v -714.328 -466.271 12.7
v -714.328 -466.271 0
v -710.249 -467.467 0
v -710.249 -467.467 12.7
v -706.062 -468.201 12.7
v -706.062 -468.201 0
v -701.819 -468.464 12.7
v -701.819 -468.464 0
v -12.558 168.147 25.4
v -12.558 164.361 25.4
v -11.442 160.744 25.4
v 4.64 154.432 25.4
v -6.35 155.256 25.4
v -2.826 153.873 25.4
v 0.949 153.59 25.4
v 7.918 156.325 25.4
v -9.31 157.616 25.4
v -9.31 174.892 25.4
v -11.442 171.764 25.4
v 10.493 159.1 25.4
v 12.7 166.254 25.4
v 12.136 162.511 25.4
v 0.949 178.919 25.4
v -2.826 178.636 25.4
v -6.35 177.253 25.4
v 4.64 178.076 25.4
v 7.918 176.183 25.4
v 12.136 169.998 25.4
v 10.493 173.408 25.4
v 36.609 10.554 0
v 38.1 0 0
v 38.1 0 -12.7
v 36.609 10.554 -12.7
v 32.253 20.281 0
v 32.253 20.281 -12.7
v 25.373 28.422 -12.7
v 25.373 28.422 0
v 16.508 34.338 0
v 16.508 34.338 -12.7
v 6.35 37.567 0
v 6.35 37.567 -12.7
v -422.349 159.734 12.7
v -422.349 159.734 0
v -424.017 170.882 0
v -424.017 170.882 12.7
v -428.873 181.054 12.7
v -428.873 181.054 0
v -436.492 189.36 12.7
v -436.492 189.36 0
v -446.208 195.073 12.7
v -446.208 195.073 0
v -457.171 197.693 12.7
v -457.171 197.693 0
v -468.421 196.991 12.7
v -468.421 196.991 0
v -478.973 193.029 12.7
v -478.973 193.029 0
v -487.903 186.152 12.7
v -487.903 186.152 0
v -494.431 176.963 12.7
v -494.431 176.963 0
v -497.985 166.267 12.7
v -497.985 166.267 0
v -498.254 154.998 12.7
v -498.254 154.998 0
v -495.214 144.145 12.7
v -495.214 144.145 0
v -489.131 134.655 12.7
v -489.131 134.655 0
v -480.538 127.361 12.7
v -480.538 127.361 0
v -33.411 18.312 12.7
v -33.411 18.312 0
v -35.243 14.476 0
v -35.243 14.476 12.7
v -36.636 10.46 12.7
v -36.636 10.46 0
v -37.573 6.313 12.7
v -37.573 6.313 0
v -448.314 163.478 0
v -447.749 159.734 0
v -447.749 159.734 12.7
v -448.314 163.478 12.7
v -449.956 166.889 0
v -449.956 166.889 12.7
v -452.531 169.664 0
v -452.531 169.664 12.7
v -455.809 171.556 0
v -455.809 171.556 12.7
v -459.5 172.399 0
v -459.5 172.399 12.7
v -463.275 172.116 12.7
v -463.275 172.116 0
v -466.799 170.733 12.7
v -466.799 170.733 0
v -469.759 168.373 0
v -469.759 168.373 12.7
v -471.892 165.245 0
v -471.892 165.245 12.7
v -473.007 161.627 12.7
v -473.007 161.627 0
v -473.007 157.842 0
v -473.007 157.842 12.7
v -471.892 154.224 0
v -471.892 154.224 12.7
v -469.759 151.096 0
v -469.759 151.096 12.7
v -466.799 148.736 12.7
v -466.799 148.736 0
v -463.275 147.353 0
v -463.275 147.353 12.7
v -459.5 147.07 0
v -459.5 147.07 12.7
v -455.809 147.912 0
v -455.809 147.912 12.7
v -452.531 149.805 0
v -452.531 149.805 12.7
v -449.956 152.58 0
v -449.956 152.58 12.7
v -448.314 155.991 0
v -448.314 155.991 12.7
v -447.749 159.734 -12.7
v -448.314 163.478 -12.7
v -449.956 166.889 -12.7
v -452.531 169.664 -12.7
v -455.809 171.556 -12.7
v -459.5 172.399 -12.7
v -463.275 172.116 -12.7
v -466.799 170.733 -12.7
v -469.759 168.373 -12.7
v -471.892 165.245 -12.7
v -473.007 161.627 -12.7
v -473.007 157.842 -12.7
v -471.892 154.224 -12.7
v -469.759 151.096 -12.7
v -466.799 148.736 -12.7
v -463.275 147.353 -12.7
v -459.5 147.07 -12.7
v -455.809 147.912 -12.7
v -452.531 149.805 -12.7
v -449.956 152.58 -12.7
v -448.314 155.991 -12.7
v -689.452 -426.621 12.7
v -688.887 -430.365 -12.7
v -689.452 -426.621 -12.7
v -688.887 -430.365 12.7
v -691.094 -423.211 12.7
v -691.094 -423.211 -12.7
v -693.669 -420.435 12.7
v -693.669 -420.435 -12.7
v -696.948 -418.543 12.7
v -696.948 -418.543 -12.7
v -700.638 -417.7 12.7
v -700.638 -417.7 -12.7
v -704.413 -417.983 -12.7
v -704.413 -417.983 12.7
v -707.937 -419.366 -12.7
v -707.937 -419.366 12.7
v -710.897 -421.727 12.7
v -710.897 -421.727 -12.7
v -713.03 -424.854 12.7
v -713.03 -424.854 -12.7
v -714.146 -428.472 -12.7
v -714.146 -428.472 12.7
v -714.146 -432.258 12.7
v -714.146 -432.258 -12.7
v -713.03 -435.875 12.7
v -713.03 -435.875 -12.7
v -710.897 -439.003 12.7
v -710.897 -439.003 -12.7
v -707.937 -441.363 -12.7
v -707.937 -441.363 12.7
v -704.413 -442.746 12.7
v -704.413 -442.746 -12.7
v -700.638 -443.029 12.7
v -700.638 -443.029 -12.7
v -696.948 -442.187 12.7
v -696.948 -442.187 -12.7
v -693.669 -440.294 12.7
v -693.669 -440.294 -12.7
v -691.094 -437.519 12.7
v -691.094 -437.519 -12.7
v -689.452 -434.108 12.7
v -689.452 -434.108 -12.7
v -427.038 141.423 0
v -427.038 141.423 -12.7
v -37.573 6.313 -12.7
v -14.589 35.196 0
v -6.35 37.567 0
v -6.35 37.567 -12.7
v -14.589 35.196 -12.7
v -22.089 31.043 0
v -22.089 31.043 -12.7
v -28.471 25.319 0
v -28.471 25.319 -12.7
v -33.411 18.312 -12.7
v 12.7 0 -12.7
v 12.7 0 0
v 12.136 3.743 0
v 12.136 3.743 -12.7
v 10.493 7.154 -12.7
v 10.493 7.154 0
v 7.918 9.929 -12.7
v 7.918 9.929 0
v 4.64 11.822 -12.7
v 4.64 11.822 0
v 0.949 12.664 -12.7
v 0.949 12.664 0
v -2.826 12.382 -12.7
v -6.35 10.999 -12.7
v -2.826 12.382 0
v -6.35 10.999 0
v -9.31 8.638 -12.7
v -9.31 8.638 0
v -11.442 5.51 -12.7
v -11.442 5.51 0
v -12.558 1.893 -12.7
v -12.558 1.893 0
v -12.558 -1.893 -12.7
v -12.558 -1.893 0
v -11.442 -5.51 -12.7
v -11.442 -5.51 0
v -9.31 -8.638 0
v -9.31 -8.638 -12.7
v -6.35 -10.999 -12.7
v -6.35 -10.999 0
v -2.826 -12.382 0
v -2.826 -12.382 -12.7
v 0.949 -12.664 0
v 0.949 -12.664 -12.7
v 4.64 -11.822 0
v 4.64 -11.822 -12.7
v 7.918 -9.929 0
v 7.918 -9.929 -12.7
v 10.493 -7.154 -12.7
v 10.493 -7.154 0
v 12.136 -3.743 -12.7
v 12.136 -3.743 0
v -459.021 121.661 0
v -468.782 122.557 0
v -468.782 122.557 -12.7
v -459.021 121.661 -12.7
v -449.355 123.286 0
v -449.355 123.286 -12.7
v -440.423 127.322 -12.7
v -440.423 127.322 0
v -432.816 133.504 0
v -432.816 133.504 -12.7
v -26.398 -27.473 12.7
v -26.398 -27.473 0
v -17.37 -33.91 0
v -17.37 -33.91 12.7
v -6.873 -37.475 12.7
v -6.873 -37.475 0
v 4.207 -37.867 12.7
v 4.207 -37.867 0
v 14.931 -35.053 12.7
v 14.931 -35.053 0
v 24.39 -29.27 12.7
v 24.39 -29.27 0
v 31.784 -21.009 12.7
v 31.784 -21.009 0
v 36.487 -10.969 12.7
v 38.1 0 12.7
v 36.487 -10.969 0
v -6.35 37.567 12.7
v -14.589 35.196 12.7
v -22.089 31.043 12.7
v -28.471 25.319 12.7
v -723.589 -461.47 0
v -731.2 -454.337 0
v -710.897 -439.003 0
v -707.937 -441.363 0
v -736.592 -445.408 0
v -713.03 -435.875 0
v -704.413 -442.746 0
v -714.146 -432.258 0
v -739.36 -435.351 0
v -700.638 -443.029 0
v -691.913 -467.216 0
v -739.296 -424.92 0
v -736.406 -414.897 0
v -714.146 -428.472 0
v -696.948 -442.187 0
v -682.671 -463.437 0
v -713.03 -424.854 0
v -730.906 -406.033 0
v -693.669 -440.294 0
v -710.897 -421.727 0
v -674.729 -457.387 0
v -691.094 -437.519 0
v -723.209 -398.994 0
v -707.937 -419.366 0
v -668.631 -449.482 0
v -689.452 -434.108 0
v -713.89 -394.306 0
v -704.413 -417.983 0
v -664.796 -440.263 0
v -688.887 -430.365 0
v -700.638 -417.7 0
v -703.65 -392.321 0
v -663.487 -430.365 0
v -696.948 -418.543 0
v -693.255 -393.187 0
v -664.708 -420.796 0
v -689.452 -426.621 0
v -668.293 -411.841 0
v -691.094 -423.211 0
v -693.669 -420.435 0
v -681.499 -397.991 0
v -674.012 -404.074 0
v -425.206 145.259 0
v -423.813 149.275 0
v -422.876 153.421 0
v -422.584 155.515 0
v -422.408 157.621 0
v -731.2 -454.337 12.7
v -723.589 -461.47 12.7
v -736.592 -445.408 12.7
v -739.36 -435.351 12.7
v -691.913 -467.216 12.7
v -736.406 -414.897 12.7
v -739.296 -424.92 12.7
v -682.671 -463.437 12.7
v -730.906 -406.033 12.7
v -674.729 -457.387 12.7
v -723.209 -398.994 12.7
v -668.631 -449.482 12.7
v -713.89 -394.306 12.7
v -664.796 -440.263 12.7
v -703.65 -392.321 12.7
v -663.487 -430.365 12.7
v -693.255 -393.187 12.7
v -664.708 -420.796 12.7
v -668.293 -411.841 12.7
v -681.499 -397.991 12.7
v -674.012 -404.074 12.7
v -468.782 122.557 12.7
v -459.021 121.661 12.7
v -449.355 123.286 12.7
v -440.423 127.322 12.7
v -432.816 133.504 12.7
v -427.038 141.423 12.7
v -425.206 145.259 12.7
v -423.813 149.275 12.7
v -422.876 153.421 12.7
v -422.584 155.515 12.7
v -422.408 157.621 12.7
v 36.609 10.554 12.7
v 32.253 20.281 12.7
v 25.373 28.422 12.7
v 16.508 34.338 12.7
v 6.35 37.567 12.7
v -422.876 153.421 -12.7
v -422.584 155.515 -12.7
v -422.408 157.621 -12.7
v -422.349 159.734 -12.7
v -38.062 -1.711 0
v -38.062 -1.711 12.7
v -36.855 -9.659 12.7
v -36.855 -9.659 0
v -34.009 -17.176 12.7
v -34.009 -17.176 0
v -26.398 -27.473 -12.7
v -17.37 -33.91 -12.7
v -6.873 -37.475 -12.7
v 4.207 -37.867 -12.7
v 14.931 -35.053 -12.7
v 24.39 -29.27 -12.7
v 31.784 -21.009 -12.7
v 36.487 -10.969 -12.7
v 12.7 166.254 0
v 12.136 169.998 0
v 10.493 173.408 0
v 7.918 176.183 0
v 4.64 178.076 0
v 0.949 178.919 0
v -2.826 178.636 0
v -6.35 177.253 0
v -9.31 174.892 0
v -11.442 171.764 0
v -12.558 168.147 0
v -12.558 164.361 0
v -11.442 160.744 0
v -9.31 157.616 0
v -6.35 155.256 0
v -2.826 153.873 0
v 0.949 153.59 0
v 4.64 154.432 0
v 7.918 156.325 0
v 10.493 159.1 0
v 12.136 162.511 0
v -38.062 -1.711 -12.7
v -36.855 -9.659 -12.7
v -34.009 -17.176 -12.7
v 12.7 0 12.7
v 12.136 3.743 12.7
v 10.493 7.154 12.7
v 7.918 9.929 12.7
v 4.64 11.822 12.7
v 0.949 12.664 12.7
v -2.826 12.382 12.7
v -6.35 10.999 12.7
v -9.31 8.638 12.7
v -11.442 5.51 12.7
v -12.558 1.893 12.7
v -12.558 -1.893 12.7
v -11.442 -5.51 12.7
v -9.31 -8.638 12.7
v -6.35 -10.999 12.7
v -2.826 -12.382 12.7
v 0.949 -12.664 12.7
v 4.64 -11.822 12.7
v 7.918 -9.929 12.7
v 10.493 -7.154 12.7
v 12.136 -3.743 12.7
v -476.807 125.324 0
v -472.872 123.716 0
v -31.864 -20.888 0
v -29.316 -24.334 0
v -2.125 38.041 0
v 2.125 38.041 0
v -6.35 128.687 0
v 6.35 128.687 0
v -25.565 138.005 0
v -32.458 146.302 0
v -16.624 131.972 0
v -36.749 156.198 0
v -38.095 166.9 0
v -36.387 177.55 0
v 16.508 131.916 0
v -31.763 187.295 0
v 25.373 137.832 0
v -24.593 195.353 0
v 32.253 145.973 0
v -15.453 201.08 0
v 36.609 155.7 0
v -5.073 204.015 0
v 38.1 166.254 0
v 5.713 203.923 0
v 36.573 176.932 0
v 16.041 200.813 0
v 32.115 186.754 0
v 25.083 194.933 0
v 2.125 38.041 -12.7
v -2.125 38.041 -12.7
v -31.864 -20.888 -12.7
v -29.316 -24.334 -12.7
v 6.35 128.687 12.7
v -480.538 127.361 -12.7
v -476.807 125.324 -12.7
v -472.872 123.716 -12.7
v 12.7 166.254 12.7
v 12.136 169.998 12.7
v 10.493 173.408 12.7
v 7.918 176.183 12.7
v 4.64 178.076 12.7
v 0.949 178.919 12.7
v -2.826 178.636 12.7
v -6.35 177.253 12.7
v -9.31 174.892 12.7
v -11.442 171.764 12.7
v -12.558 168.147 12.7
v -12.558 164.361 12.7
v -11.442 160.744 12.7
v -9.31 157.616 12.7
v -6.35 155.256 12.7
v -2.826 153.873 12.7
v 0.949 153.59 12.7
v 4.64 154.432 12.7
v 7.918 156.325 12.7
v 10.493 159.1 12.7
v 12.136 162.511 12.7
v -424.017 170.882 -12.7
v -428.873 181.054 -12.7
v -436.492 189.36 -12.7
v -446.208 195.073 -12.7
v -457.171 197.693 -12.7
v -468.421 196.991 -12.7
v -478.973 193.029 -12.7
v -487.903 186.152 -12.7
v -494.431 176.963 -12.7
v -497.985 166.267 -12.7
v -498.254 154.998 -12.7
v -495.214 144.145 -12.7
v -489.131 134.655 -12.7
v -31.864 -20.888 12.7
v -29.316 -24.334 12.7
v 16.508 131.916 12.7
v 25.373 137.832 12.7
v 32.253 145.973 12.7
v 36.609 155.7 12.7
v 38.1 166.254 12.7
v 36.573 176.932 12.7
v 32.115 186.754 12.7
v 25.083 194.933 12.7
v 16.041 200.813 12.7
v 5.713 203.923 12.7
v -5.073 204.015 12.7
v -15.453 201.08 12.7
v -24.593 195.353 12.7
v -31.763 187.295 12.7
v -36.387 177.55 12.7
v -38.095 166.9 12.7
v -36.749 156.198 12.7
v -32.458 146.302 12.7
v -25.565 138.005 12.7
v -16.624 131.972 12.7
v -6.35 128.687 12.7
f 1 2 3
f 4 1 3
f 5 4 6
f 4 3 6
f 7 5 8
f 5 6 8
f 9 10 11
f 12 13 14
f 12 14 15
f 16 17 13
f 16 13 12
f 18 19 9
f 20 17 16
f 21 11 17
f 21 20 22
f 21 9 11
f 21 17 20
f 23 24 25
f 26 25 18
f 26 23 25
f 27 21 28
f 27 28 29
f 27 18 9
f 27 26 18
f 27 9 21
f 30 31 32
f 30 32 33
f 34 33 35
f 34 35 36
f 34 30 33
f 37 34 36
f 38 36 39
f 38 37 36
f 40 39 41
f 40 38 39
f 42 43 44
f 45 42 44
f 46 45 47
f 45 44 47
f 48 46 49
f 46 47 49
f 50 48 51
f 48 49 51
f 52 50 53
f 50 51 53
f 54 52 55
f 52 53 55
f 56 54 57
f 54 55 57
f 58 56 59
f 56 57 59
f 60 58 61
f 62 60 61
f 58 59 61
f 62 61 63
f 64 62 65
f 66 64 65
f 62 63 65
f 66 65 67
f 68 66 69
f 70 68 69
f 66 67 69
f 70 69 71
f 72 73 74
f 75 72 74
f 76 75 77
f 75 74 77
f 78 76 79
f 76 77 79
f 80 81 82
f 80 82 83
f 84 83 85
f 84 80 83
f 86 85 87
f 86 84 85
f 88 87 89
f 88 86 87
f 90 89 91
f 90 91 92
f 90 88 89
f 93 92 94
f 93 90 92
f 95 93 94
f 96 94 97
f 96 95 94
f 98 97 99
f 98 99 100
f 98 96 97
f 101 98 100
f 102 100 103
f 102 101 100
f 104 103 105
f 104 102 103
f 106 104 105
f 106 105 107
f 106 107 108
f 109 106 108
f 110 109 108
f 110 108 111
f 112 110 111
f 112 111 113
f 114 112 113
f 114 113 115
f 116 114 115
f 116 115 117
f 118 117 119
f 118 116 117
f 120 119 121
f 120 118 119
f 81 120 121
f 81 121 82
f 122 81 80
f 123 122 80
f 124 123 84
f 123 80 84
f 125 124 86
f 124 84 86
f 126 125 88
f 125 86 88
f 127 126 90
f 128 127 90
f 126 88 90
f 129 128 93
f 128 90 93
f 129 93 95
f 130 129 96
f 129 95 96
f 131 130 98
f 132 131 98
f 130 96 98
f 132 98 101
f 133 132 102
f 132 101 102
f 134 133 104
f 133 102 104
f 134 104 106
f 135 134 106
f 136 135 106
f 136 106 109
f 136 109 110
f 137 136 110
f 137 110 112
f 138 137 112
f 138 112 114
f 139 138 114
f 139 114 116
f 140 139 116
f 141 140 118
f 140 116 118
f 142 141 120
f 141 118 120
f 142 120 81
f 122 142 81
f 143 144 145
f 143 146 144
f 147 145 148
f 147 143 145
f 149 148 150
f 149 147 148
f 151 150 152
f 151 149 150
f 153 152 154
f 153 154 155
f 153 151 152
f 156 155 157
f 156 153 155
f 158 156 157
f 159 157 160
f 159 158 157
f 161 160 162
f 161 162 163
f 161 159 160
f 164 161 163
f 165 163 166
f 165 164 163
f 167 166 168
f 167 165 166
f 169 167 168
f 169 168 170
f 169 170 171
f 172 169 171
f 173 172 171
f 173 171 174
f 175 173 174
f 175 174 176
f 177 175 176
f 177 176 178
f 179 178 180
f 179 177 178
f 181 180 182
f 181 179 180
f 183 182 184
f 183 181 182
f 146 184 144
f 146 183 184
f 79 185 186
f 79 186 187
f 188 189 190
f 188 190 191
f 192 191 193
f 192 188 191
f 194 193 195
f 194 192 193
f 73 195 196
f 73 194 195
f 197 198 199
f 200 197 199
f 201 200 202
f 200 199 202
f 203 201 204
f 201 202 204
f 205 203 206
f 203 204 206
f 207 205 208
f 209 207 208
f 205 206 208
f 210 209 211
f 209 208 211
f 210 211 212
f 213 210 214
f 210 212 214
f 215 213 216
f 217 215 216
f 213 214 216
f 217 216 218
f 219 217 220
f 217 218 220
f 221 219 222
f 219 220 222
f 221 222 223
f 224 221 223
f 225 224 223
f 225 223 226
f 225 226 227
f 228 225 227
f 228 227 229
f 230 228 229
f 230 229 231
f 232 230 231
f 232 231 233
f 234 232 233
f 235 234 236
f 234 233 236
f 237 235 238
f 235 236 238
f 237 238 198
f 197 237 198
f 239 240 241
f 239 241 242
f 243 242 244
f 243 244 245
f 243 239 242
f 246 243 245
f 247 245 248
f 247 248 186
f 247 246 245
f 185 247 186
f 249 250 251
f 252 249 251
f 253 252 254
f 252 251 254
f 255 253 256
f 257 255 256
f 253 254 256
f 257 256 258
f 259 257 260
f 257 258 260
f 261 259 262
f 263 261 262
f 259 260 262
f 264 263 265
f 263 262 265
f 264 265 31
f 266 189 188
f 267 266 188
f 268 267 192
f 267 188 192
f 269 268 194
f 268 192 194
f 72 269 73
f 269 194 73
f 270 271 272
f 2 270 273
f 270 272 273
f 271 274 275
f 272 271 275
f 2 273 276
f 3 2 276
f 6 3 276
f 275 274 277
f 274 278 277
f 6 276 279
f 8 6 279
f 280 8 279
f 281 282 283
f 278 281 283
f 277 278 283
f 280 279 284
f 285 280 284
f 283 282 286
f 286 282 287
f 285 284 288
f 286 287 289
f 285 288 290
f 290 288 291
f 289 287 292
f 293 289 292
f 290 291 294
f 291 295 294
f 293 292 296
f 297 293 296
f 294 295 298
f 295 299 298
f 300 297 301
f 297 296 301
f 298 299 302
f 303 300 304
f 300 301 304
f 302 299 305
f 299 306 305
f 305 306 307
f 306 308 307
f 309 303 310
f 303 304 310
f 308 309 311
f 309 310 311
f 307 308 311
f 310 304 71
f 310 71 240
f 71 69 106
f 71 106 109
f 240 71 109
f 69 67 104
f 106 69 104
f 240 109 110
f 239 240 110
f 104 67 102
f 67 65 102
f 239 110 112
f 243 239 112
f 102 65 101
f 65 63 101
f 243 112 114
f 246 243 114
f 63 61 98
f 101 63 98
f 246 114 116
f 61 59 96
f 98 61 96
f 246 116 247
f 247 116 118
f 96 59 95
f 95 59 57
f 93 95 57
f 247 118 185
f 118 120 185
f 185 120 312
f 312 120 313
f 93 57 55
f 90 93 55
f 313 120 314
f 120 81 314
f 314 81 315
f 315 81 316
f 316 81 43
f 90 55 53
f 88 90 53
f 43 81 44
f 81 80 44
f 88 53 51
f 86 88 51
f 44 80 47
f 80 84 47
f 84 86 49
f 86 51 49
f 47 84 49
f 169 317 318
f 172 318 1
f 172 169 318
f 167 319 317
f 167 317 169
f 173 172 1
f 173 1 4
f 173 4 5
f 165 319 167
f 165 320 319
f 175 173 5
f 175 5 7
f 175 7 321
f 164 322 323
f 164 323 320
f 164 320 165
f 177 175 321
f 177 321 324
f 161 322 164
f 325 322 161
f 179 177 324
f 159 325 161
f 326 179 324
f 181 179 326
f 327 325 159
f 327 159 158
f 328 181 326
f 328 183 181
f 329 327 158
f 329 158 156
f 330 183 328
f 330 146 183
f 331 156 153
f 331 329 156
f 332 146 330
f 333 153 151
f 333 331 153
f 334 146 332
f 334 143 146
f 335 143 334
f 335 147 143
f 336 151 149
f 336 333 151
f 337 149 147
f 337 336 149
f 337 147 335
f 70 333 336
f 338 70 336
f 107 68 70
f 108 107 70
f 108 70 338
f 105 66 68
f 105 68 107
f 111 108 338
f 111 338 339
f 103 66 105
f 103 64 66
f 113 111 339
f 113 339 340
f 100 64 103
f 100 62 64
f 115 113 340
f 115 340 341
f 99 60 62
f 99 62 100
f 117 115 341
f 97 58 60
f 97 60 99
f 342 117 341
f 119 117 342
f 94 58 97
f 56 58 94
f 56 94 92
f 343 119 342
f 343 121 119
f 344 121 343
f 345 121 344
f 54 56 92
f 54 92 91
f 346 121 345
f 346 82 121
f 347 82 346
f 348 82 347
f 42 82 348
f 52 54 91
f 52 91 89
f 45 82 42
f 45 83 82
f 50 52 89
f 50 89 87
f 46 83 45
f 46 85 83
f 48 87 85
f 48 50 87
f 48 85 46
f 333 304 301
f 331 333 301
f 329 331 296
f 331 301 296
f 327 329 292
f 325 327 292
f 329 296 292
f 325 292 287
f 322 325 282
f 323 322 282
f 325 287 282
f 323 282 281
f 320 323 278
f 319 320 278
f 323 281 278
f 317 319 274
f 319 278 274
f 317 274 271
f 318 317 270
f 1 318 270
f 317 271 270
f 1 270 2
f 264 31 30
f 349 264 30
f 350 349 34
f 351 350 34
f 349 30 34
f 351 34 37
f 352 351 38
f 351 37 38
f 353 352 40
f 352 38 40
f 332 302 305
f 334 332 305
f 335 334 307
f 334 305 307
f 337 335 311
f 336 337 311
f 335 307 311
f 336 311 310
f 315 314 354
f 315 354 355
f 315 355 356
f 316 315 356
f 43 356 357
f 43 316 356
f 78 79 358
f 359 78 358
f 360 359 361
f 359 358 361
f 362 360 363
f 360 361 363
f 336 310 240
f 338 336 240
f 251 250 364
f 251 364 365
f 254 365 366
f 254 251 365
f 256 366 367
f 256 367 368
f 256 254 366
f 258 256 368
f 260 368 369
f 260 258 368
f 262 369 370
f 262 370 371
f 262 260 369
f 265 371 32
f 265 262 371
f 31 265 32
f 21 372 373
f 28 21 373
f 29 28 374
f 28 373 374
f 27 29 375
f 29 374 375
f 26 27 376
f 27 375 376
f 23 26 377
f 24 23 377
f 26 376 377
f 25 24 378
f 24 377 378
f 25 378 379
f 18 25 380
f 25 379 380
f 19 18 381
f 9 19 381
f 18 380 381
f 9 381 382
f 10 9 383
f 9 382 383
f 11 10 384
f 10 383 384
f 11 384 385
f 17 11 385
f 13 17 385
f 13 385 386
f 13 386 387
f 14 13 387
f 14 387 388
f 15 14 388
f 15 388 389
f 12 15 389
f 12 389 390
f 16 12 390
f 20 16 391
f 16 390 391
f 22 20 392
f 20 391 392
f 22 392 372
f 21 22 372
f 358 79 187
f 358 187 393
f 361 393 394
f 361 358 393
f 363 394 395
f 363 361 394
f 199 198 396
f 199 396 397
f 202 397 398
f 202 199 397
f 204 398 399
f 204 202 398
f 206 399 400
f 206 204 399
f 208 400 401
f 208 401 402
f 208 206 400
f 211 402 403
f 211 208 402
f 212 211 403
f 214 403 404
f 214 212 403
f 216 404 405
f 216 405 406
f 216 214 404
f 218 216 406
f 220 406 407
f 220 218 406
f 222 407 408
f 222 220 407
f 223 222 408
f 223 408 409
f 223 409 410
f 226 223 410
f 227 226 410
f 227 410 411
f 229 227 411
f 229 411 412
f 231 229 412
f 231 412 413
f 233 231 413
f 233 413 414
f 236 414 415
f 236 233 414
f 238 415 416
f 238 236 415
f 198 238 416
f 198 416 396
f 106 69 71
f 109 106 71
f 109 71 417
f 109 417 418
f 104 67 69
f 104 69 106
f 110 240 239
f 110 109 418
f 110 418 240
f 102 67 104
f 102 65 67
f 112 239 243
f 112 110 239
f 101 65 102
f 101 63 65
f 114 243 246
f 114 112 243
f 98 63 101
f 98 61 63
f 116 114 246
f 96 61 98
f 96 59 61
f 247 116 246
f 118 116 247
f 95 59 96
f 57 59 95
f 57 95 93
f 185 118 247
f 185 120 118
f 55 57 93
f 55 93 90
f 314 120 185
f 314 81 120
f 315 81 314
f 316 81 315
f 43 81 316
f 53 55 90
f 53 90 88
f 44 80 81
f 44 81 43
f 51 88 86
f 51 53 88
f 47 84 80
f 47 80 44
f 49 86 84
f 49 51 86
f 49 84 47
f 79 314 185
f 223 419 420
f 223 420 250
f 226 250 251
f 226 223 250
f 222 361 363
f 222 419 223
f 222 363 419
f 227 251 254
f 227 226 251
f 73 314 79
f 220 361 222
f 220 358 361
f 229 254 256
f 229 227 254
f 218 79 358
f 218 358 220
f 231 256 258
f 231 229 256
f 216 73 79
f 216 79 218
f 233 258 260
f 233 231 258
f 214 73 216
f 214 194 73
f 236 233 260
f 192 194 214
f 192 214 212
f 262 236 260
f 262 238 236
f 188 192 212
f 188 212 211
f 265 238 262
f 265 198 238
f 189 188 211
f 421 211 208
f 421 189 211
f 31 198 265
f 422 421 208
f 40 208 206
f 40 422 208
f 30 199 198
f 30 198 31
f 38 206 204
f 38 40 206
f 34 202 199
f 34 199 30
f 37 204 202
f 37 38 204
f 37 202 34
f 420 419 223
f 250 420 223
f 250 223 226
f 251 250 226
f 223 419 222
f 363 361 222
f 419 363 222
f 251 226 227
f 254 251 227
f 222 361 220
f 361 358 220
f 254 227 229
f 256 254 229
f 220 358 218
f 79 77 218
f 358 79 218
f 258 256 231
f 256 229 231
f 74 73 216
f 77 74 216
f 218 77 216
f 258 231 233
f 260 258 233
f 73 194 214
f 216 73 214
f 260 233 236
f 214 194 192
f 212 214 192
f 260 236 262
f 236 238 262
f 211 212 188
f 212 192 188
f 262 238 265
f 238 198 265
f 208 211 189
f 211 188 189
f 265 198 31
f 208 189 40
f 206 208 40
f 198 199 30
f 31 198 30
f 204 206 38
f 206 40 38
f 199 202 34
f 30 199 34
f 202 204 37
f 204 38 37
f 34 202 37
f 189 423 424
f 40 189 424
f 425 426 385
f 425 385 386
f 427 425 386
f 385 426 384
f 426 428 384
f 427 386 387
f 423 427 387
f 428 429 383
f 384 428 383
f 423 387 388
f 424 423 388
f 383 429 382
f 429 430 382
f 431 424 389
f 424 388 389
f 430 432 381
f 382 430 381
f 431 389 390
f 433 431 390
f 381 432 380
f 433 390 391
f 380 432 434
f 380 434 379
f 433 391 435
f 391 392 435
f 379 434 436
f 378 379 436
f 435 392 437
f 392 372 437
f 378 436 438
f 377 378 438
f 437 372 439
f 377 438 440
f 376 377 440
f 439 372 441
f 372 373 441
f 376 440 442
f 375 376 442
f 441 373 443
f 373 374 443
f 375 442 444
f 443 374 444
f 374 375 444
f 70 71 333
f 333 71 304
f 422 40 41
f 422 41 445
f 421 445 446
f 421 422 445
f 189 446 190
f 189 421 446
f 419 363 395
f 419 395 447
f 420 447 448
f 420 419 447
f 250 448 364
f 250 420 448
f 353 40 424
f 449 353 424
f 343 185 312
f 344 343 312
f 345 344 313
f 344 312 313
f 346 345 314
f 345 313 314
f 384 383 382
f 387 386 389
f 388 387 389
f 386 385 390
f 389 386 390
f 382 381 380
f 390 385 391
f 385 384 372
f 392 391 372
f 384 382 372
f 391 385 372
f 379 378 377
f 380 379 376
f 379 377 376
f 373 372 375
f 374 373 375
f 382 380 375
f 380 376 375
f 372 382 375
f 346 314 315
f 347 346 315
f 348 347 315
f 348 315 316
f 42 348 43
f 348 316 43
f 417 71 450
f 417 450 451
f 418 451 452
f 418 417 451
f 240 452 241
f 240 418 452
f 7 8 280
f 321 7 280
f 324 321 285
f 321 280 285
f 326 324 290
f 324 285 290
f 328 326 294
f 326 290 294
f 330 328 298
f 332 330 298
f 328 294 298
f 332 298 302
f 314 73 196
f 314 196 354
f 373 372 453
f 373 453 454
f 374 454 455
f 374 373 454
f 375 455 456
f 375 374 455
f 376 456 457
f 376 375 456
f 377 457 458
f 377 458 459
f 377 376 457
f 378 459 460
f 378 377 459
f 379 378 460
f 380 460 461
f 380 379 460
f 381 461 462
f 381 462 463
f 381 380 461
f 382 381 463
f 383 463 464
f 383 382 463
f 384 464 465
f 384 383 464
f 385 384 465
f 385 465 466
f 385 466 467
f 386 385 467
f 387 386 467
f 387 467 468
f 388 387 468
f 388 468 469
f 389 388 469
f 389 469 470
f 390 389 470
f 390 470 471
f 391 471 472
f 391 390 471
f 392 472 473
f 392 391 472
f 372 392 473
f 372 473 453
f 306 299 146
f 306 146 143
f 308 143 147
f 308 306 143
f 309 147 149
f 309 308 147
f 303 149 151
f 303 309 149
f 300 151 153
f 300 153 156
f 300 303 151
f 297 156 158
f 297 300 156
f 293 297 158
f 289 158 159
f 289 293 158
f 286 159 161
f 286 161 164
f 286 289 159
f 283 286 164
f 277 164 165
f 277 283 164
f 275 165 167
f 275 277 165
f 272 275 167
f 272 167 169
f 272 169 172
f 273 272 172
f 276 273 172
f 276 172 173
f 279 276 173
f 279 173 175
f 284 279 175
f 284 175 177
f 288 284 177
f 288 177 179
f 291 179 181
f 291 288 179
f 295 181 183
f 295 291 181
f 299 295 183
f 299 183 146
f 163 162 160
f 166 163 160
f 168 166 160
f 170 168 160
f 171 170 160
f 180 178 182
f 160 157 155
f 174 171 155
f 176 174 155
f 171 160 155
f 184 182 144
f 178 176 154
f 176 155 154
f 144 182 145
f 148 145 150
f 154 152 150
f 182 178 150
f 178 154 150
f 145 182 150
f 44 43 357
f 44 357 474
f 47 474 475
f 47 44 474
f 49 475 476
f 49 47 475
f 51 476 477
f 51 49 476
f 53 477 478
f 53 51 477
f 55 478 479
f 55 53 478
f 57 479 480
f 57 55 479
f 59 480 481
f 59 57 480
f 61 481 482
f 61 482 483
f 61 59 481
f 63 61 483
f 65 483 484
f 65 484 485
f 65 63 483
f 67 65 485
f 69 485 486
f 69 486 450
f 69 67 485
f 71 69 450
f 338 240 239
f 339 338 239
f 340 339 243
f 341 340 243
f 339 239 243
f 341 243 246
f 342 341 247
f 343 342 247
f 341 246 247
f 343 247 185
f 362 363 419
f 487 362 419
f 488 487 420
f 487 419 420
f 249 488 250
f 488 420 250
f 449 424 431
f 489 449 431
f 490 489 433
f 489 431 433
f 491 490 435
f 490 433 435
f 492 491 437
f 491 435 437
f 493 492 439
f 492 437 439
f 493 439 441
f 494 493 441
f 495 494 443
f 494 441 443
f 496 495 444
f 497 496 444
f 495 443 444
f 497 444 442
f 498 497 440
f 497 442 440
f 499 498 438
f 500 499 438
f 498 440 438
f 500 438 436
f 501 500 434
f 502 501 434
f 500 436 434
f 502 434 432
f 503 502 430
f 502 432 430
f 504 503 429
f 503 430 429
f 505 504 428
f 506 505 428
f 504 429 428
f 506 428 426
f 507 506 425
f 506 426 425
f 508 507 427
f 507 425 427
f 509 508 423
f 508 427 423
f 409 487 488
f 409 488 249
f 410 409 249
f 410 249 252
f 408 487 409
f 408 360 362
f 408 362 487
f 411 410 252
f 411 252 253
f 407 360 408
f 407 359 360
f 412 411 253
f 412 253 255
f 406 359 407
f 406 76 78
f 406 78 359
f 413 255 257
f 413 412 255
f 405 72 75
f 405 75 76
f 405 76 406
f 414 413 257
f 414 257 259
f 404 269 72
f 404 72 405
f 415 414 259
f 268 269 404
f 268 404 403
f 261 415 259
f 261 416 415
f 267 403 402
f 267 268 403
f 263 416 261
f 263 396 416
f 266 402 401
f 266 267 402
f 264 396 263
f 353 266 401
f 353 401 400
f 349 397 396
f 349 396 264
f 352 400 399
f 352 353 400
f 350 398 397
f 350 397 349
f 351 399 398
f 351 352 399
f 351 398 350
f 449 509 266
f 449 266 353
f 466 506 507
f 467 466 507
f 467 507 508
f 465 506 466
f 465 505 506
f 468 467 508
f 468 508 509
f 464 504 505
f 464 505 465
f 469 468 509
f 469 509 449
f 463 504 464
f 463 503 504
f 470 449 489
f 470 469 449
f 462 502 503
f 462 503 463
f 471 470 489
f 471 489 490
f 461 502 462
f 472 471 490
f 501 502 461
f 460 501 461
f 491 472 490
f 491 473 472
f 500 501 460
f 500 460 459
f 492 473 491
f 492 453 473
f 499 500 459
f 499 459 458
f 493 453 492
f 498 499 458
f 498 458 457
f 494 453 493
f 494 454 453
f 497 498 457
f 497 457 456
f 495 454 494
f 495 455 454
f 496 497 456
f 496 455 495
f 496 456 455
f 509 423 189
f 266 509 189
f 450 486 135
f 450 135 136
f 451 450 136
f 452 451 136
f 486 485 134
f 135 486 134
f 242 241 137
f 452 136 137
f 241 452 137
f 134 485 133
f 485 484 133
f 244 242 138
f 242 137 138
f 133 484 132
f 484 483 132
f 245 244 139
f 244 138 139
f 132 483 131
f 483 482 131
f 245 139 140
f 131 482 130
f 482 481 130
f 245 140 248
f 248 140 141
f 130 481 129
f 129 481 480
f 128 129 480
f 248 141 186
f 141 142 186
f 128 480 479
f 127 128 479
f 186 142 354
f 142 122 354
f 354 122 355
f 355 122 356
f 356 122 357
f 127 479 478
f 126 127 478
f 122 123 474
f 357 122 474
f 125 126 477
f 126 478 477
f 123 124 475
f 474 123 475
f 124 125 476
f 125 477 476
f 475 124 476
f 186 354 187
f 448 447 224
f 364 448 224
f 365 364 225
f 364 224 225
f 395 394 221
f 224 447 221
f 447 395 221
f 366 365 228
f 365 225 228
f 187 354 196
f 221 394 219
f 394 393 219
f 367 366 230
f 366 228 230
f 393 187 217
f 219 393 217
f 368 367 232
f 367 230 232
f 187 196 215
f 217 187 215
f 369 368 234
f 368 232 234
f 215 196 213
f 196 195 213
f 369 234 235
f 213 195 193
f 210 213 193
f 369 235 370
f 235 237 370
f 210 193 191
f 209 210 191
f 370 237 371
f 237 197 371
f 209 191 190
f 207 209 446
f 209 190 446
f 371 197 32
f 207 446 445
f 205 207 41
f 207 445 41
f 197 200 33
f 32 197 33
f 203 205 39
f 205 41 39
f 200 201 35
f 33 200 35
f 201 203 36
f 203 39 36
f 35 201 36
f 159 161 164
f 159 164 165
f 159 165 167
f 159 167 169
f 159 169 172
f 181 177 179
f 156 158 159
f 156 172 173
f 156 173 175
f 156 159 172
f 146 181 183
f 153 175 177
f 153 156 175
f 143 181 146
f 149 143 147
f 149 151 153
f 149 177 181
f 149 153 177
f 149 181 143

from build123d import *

# Parameters (mm, degrees)
F0_R          = 12.7
F1_DEPTH      = 12.7
F2_DEPTH      = 25.4
F3_DEPTH      = 12.7
F4_DEPTH      = 12.7
F5_DEPTH      = 12.7
F5_DEPTH_BACK = 12.7


with BuildPart() as f1:
    # F0 (on Top) → F1 (new body)
    with BuildSketch(Plane.XY):
        with BuildLine():
            ThreePointArc((-6.35, 128.687026), (0, 128.154133), (6.35, 128.687026))
            ThreePointArc((6.35, 128.687026), (29.099356, 141.660689), (38.1, 166.254133))
            ThreePointArc((38.1, 166.254133), (-24.593444, 195.353489), (-6.35, 128.687026))
        make_face()
        with Locations((0, 166.254133)):
            Circle(F0_R, mode=Mode.SUBTRACT)
        with BuildLine():
            ThreePointArc((-6.35, 37.567107), (0, 38.1), (6.35, 37.567107))
            Line((6.35, 37.567107), (6.35, 128.687026))
            ThreePointArc((6.35, 128.687026), (0, 128.154133), (-6.35, 128.687026))
            Line((-6.35, 128.687026), (-6.35, 37.567107))
        make_face()
        with BuildLine():
            ThreePointArc((-26.397527, -27.47327), (14.930911, -35.052502), (38.1, 0))
            ThreePointArc((38.1, 0), (29.099356, 24.593444), (6.35, 37.567107))
            ThreePointArc((6.35, 37.567107), (0, 38.1), (-6.35, 37.567107))
            ThreePointArc((-6.35, 37.567107), (-22.088994, 31.043298), (-33.410889, 18.311813))
            ThreePointArc((-33.410889, 18.311813), (-35.99555, 12.48721), (-37.573292, 6.313297))
            ThreePointArc((-37.573292, 6.313297), (-37.668703, -5.716537), (-34.008532, -17.17643))
            ThreePointArc((-34.008532, -17.17643), (-30.638688, -22.646871), (-26.397527, -27.47327))
        make_face()
        Circle(F0_R, mode=Mode.SUBTRACT)
    extrude(amount=F1_DEPTH)


with BuildPart() as f2:
    # F0 (on Top) → F2 (new body)
    with BuildSketch(Plane.XY):
        with Locations((0, 166.254133)):
            Circle(F0_R)
    extrude(amount=F2_DEPTH)


with BuildPart() as f3:
    # F0 (on Top) → F3 (new body)
    with BuildSketch(Plane.XY):
        with BuildLine():
            ThreePointArc((-427.038437, 141.422583), (-424.453776, 147.247186), (-422.876033, 153.421099))
            ThreePointArc((-422.876033, 153.421099), (-422.481231, 156.566781), (-422.349325, 159.734396))
            ThreePointArc((-422.349325, 159.734396), (-478.972615, 193.028506), (-480.538184, 127.36083))
            ThreePointArc((-480.538184, 127.36083), (-474.861613, 124.465487), (-468.781881, 122.556734))
            ThreePointArc((-468.781881, 122.556734), (-444.758221, 125.015536), (-427.038437, 141.422583))
        make_face()
        with Locations((-460.449325, 159.734396)):
            Circle(F0_R, mode=Mode.SUBTRACT)
        with BuildLine():
            ThreePointArc((-37.573292, 6.313297), (-35.99555, 12.48721), (-33.410889, 18.311813))
            Line((-33.410889, 18.311813), (-422.876033, 153.421099))
            ThreePointArc((-422.876033, 153.421099), (-424.453776, 147.247186), (-427.038437, 141.422583))
            Line((-427.038437, 141.422583), (-37.573292, 6.313297))
        make_face()
        with BuildLine():
            ThreePointArc((-26.397527, -27.47327), (14.930911, -35.052502), (38.1, 0))
            ThreePointArc((38.1, 0), (29.099356, 24.593444), (6.35, 37.567107))
            ThreePointArc((6.35, 37.567107), (0, 38.1), (-6.35, 37.567107))
            ThreePointArc((-6.35, 37.567107), (-22.088994, 31.043298), (-33.410889, 18.311813))
            ThreePointArc((-33.410889, 18.311813), (-35.99555, 12.48721), (-37.573292, 6.313297))
            ThreePointArc((-37.573292, 6.313297), (-37.668703, -5.716537), (-34.008532, -17.17643))
            ThreePointArc((-34.008532, -17.17643), (-30.638688, -22.646871), (-26.397527, -27.47327))
        make_face()
        Circle(F0_R, mode=Mode.SUBTRACT)
    extrude(amount=-F3_DEPTH)


with BuildPart() as f4:
    # F0 (on Top) → F4 (new body)
    with BuildSketch(Plane.XY):
        with BuildLine():
            ThreePointArc((-427.038437, 141.422583), (-424.453776, 147.247186), (-422.876033, 153.421099))
            ThreePointArc((-422.876033, 153.421099), (-422.481231, 156.566781), (-422.349325, 159.734396))
            ThreePointArc((-422.349325, 159.734396), (-478.972615, 193.028506), (-480.538184, 127.36083))
            ThreePointArc((-480.538184, 127.36083), (-474.861613, 124.465487), (-468.781881, 122.556734))
            ThreePointArc((-468.781881, 122.556734), (-444.758221, 125.015536), (-427.038437, 141.422583))
        make_face()
        with Locations((-460.449325, 159.734396)):
            Circle(F0_R, mode=Mode.SUBTRACT)
        with BuildLine():
            Line((-681.498578, -397.991163), (-468.781881, 122.556734))
            ThreePointArc((-468.781881, 122.556734), (-474.861613, 124.465487), (-480.538184, 127.36083))
            Line((-480.538184, 127.36083), (-693.254881, -393.187068))
            ThreePointArc((-693.254881, -393.187068), (-687.175149, -395.09582), (-681.498578, -397.991163))
        make_face()
        with BuildLine():
            ThreePointArc((-714.328414, -466.27124), (-708.165791, -467.892522), (-701.81915, -468.464025))
            ThreePointArc((-701.81915, -468.464025), (-674.728716, -457.387296), (-663.487437, -430.364729))
            ThreePointArc((-663.487437, -430.364729), (-668.293327, -411.84144), (-681.498578, -397.991163))
            ThreePointArc((-681.498578, -397.991163), (-687.175149, -395.09582), (-693.254881, -393.187068))
            ThreePointArc((-693.254881, -393.187068), (-738.195941, -419.808811), (-714.328414, -466.27124))
        make_face()
        with Locations((-701.587437, -430.364729)):
            Circle(F0_R, mode=Mode.SUBTRACT)
    extrude(amount=F4_DEPTH)


with BuildPart() as f5:
    # F0 (on Top) → F5 (new body, two sides)
    with BuildSketch(Plane.XY) as f5_sk:
        with Locations((-701.587437, -430.364729)):
            Circle(F0_R)
    extrude(amount=F5_DEPTH)
    extrude(f5_sk.sketch, amount=-F5_DEPTH_BACK)


solid = Compound([f1.part, f2.part, f3.part, f4.part, f5.part])
